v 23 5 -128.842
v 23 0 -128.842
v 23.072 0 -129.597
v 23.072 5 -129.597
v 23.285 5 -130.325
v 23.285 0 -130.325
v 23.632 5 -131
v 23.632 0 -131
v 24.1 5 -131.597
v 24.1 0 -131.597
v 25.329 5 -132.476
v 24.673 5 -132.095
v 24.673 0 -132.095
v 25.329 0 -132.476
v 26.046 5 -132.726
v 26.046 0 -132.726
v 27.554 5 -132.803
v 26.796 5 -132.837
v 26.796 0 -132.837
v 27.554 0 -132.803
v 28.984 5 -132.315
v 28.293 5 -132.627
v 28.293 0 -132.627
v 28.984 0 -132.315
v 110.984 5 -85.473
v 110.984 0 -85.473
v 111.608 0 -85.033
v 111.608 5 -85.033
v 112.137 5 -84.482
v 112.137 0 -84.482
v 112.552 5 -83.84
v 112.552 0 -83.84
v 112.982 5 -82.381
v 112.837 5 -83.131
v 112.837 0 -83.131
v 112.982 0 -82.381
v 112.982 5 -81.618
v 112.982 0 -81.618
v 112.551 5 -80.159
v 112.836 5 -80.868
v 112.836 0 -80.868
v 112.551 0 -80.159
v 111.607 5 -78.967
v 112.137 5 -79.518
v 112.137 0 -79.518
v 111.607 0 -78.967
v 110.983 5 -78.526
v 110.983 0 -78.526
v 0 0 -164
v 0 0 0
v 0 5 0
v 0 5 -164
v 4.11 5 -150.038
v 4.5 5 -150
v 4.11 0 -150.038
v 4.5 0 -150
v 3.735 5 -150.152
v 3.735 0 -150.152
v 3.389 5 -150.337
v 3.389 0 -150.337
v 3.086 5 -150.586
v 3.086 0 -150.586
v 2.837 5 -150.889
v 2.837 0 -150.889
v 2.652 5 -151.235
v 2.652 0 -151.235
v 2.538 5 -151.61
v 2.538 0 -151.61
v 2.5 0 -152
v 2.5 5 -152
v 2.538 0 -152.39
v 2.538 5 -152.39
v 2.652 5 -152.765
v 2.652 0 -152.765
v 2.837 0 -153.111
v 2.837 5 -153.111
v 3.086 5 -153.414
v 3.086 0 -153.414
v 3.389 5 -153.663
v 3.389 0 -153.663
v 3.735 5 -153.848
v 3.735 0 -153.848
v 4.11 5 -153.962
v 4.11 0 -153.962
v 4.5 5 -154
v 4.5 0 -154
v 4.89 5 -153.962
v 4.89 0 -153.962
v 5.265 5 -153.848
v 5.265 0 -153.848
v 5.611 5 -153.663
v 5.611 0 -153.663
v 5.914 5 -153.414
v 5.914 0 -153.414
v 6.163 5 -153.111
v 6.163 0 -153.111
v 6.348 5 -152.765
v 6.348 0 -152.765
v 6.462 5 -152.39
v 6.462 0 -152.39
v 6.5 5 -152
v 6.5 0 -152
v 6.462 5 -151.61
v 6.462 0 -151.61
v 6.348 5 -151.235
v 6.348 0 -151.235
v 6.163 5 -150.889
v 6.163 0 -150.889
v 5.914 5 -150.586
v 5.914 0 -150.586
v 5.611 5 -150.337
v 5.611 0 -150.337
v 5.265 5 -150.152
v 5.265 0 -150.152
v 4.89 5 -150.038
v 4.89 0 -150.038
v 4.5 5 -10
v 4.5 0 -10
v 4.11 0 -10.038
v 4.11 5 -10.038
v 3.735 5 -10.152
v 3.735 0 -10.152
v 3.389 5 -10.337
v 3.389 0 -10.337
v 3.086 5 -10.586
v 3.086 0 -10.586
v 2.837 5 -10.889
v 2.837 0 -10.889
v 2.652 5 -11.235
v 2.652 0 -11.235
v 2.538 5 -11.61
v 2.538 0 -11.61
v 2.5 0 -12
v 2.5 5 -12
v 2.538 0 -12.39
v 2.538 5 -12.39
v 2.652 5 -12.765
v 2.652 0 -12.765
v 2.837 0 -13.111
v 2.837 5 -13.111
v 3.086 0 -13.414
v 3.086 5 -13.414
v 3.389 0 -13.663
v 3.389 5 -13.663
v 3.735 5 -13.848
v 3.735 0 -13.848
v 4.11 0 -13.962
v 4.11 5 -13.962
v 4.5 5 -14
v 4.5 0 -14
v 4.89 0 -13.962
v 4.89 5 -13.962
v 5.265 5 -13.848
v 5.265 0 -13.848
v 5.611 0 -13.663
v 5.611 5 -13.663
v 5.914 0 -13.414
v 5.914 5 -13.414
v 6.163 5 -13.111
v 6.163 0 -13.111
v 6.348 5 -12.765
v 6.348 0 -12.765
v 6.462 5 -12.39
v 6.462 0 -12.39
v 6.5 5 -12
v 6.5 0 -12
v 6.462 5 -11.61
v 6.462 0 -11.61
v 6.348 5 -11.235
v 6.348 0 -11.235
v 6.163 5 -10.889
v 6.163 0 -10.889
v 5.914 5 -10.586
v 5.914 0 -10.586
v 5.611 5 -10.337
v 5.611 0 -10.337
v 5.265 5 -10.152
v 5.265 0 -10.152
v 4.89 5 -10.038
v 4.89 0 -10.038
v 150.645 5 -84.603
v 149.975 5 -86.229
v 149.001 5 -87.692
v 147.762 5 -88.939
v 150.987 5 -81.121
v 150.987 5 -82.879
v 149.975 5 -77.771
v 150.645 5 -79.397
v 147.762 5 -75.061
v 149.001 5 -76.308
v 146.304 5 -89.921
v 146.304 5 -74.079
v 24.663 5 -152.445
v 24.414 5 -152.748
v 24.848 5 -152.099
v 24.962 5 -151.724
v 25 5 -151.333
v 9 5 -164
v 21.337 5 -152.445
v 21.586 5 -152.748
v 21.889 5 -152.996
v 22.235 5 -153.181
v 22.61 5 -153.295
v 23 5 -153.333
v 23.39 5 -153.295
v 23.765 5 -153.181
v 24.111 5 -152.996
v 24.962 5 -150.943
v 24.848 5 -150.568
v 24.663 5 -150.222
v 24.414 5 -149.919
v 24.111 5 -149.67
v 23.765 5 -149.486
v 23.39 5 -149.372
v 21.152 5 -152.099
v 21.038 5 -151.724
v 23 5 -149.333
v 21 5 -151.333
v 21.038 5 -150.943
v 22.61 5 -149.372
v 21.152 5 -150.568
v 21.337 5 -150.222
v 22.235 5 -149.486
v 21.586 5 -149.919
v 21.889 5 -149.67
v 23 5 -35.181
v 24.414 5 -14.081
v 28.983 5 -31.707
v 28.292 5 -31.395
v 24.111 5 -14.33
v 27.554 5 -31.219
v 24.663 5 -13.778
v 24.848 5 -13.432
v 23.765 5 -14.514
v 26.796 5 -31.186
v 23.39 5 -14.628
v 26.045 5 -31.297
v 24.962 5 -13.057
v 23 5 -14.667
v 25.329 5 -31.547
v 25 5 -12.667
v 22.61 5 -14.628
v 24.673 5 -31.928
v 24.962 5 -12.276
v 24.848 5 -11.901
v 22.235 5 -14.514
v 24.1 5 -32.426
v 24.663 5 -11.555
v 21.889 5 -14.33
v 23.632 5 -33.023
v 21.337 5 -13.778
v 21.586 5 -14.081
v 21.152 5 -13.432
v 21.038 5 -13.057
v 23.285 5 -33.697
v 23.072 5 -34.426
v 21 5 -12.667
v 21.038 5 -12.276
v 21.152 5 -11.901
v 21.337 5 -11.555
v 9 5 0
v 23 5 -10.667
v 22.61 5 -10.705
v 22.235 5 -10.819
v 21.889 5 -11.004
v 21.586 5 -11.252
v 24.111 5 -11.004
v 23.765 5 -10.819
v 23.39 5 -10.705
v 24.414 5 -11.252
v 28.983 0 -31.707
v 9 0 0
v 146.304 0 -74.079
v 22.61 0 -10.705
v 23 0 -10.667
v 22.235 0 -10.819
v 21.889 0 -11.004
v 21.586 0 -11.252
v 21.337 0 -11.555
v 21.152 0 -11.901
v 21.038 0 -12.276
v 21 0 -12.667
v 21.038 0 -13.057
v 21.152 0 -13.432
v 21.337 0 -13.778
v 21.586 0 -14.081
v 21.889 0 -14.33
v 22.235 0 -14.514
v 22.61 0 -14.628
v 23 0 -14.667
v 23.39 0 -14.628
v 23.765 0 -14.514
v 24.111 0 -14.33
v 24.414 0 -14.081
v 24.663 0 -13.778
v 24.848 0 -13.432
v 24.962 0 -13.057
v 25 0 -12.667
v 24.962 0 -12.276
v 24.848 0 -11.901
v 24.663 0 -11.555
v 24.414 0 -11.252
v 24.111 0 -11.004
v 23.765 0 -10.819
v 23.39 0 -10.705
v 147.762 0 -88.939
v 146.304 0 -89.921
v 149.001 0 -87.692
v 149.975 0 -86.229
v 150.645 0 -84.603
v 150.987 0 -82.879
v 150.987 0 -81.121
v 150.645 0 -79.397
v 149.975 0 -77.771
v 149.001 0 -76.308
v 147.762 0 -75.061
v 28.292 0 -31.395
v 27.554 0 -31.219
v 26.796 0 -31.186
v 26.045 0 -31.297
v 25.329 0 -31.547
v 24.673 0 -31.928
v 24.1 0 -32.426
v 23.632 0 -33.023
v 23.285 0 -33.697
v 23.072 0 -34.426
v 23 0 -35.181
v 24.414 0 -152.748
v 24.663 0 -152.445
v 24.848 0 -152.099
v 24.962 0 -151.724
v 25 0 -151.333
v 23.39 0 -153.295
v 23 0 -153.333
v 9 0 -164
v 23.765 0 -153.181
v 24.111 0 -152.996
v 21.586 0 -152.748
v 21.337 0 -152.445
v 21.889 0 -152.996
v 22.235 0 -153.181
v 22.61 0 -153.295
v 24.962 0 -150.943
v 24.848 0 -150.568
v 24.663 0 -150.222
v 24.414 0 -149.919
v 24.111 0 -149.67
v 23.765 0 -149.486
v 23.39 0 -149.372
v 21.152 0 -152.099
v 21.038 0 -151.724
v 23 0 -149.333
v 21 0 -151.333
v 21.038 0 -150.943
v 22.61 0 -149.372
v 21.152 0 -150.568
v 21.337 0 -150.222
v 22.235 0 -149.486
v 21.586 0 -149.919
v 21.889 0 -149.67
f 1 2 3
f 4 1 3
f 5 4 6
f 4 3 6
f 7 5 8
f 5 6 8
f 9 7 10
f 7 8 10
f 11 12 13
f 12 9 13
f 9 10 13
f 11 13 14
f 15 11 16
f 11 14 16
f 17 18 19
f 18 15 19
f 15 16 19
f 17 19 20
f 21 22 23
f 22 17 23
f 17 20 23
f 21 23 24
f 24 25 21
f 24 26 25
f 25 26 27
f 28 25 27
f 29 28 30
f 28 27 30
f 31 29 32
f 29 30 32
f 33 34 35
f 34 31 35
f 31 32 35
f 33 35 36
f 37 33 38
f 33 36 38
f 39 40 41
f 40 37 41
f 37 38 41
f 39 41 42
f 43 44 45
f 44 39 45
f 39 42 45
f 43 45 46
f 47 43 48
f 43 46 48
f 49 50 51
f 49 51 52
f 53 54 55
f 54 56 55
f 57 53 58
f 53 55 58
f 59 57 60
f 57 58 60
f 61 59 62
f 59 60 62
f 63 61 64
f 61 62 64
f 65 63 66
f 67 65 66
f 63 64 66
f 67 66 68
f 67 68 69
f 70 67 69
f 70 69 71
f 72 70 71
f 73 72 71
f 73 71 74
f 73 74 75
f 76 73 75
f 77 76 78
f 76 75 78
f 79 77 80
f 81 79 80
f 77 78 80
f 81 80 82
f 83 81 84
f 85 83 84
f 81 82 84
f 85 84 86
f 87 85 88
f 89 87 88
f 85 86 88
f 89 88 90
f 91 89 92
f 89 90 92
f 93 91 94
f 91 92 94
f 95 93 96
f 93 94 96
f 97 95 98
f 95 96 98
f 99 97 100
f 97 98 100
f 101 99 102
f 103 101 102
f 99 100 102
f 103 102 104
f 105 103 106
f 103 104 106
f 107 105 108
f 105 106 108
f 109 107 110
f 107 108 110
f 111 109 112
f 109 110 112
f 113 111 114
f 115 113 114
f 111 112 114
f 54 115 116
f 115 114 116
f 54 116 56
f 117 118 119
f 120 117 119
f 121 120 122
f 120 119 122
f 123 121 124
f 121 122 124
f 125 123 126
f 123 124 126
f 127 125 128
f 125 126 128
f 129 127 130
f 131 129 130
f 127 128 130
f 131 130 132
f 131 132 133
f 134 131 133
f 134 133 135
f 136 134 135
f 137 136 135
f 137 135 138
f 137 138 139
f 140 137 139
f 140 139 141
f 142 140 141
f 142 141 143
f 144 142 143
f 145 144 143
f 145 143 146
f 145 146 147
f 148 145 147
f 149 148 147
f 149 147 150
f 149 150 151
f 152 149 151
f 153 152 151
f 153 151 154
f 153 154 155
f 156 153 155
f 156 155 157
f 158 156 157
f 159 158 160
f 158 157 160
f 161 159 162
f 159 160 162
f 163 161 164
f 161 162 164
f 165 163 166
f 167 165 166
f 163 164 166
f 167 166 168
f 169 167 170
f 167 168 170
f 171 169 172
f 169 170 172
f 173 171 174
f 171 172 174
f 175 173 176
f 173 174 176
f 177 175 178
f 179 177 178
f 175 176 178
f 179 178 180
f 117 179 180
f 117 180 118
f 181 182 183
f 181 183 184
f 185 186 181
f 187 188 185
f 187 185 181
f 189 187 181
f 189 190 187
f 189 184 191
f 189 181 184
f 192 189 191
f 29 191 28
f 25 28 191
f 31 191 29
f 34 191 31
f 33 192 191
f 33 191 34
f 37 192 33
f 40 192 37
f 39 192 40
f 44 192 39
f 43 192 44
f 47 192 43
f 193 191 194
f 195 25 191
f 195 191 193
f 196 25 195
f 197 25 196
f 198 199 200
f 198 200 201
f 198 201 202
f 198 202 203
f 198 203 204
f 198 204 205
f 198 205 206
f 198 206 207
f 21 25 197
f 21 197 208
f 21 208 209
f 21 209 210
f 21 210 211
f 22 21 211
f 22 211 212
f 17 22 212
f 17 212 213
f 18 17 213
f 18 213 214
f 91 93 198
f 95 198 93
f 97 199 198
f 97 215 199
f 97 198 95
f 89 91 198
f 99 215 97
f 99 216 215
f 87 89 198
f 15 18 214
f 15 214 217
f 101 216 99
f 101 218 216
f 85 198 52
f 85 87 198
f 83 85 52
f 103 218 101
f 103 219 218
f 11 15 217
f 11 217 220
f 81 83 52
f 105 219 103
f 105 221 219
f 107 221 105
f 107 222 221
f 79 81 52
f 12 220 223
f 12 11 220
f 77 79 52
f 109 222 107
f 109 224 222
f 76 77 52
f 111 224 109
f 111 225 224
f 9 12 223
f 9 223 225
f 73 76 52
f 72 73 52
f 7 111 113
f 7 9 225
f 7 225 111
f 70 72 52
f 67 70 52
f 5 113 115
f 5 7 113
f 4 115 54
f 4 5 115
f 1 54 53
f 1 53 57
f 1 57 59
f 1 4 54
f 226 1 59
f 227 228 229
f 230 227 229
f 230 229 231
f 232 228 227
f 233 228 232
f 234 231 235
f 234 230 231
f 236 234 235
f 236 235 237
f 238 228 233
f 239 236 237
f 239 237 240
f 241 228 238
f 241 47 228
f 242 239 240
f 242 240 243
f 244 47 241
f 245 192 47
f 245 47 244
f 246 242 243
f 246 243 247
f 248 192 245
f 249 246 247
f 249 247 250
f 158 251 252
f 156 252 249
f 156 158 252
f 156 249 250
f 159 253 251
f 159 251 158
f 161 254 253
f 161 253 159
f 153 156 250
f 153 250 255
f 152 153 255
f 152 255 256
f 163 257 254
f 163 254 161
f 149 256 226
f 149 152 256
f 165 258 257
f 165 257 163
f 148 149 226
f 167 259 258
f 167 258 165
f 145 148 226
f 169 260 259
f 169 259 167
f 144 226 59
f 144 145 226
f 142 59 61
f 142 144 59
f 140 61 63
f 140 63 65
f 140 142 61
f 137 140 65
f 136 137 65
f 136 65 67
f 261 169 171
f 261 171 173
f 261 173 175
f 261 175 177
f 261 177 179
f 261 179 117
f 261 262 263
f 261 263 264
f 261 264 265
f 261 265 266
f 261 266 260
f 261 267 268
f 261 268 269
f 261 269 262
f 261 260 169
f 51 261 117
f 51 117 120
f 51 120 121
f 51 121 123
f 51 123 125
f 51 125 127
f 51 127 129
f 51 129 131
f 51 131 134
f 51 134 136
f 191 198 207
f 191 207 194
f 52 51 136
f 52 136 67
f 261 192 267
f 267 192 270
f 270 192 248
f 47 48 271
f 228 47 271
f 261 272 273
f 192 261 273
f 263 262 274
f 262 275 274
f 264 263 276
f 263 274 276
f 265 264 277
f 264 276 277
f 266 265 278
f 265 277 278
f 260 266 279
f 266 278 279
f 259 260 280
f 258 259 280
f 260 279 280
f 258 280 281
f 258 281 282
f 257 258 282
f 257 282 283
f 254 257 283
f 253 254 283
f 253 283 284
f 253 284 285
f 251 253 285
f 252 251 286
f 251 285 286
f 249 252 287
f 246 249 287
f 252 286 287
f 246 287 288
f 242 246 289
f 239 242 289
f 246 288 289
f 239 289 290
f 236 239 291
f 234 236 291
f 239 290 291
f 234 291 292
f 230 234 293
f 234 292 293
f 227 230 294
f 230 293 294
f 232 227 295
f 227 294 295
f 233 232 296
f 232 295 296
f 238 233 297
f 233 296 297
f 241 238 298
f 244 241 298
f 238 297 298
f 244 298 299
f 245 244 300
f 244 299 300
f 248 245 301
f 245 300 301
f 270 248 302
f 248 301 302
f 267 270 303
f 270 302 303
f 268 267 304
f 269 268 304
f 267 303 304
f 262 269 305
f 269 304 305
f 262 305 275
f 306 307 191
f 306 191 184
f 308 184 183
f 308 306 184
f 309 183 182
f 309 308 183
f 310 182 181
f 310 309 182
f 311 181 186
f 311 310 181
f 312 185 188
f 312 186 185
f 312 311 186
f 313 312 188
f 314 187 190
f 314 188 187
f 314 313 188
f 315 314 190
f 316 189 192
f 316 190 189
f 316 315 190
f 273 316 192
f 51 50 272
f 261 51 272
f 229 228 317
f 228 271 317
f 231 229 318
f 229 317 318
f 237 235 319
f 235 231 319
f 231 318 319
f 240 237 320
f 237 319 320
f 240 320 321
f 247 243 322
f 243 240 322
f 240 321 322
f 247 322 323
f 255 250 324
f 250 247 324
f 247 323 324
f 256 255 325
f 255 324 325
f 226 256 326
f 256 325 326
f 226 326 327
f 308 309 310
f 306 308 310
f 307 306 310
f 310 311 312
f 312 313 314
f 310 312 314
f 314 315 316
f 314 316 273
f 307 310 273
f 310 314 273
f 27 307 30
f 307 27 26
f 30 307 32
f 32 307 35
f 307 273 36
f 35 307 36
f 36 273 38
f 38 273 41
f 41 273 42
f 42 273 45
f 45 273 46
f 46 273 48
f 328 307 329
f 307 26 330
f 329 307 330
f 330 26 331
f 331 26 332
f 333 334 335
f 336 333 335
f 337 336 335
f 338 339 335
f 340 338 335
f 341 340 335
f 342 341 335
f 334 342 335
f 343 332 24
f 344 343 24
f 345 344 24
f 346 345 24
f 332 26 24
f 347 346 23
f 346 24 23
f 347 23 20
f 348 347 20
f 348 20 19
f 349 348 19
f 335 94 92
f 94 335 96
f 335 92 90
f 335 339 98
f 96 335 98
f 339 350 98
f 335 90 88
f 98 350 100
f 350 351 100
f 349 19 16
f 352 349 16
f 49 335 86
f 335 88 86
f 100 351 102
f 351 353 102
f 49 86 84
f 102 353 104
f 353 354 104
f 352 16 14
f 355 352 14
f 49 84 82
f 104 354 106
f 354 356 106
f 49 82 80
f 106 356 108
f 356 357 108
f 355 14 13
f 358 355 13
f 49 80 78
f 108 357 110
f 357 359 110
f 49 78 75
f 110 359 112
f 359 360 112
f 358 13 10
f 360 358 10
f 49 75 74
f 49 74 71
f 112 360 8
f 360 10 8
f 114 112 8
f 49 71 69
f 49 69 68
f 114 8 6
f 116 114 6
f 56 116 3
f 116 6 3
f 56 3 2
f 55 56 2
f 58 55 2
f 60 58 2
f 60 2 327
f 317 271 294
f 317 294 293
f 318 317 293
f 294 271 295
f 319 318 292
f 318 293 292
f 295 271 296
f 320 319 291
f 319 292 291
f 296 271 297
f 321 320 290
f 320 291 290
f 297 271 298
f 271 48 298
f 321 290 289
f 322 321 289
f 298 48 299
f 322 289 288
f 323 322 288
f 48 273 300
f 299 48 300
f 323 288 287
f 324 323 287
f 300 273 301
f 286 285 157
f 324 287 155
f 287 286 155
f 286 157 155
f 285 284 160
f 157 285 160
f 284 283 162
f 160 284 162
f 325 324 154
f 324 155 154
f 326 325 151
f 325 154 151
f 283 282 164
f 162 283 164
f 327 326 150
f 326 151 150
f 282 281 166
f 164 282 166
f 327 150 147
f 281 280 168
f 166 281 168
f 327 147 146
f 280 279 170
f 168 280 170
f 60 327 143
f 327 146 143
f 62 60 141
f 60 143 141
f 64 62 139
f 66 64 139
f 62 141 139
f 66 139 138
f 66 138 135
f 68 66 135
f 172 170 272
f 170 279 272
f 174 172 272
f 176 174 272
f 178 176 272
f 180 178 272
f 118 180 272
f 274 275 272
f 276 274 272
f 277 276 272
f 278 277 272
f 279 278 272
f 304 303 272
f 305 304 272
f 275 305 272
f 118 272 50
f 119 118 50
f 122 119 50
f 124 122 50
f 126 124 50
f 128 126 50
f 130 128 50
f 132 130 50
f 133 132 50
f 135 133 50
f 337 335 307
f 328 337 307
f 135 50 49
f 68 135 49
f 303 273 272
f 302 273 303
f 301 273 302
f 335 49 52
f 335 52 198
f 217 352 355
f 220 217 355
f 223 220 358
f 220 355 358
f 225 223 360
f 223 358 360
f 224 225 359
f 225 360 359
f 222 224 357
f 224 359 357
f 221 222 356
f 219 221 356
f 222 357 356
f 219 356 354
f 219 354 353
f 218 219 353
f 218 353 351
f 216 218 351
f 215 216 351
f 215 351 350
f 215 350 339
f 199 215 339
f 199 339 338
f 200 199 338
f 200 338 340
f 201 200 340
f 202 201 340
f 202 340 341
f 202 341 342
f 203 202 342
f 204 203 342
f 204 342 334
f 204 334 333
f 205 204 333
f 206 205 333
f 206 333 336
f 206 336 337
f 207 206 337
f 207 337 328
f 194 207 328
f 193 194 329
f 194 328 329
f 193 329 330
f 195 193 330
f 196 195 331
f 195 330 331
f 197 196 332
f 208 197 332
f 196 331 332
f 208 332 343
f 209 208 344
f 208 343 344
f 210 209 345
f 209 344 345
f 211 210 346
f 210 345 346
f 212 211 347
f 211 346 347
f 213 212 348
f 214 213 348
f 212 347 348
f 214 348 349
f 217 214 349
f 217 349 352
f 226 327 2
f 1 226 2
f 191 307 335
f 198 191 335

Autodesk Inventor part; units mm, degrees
ref_plane "YZ Plane" through (0, 0, 0) normal (1, 0, 0) x (0, 1, 0)
ref_plane "XZ Plane" through (0, 0, 0) normal (0, 1, 0) x (-1, 0, 0)
ref_plane "XY Plane" through (0, 0, 0) normal (0, 0, 1) x (1, 0, 0)
sketch "Sketch1" plane through (0, 0, 0) normal (0, 1, 0) x (-1, 0, 0)
  line L0 (0, 0) -> (0, -164)
  line L1 (0, 0) -> (-9, 0)
  line L2 (0, -164) -> (-9, -164)
  line L3 (56.0828, -82) -> (-131.3763, -82) construction
  arc A0 (-146.3035, -74.0793) -> (-146.3035, -89.9207) centre (-142.03, -82) ccw
  line L4 (-110.9841, -85.4733) -> (-28.9841, -132.315)
  line L5 (-110.9833, -78.5263) -> (-28.9833, -31.7073)
  arc A1 (-23, -35.1809) -> (-28.9833, -31.7073) centre (-27, -35.1809) ccw
  arc A2 (-28.9841, -132.315) -> (-23, -128.8417) centre (-27, -128.8417) ccw
  line L6 (-23, -35.1809) -> (-23, -128.8417)
  line L7 (-146.3035, -89.9207) -> (-9, -164)
  line L8 (-9, 0) -> (-146.3035, -74.0793)
  arc A3 (-110.9833, -78.5263) -> (-110.9841, -85.4733) centre (-109, -82) ccw
  point P0 (0, -82)
  point P1 (-23, -82)
  point P2 (-75.5556, -35.9087)
  point P3 (-69.9833, -55.1168)
  point P4 (-75.5113, -128.1152)
  point P5 (-69.9841, -108.8941)
  dimension "d0" = 164
  dimension "d1" = 9
  dimension "d2" = 9
  dimension "d13" = 18
  dimension "d20" = 8
  dimension "d21" = 8
  dimension "d73" = 142.03
  dimension "d74" = 23
  dimension "d76" = 8
  dimension "d77" = 86
  dimension "d78" = 20
  dimension "d79" = 20
extrude "Extrusion1" add sketch "Sketch1" along normal blind 5
sketch "Sketch2" plane through (0, 5, 0) normal (0, 1, 0) x (1, 0, 0)
  line L0 (0, 164) -> (0, 0) projected
  line L1 (0, 82) -> (160.3523, 82) construction
  line L2 (4.5, 12) -> (4.5, 152) construction
  circle A0 centre (4.5, 12) radius 2
  circle A1 centre (4.5, 152) radius 2
  line L3 (23, 12.6666) -> (23, 144.7978) construction
  circle A2 centre (23, 12.6666) radius 2
  line L4 (23, 12.6666) -> (151.5071, 82) construction
  circle A3 centre (54.2428, 29.523) radius 2
  circle A4 centre (69.8202, 37.9275) radius 2
  line L5 (9, 0) -> (146.3035, 74.0793) projected
  circle A5 centre (85.3976, 46.3319) radius 2
  circle A6 centre (100.9749, 54.7364) radius 2
  circle A7 centre (116.5523, 63.1409) radius 2
  circle A8 centre (132.1297, 71.5453) radius 2
  circle A9 centre (38.6654, 21.1185) radius 2
  circle A10 centre (23, 151.3334) radius 2
  circle A11 centre (54.2428, 134.477) radius 2
  circle A12 centre (69.8202, 126.0725) radius 2
  circle A13 centre (85.3976, 117.6681) radius 2
  circle A14 centre (116.5523, 100.8591) radius 2
  circle A15 centre (132.1297, 92.4547) radius 2
  circle A16 centre (38.6654, 142.8815) radius 2
  point P0 (4.5, 82)
  point P1 (100.9749, 109.2636)
  dimension "d82" = 4
  dimension "d83" = 4
  dimension "d84" = 140
  dimension "d85" = 4.5
  dimension "d88" = 4
  dimension "d89" = 4
  dimension "d91" = 4
  dimension "d93" = 23
  dimension "d94" = 4.5
  dimension "d95" = 4.5
  dimension "d98" = 4
  dimension "d99" = 4
  dimension "d100" = 4
  dimension "d101" = 4
  dimension "d106" = 17.7
  dimension "d107" = 17.7
  dimension "d108" = 17.7
  dimension "d109" = 17.7
  dimension "d110" = 124
  dimension "d111" = 17.7
  dimension "d112" = 4
  dimension "d113" = 17.7
hole "Hole2" at (4.5, 5, -12) at (23, 5, -12.6666) at (4.5, 5, -152) at (23, 5, -151.3334) direction (0, -1, 0) diameter 4 depth 10 tip angle 118
equation "\"d95\" = d94"
properties part number "17 nueva"
